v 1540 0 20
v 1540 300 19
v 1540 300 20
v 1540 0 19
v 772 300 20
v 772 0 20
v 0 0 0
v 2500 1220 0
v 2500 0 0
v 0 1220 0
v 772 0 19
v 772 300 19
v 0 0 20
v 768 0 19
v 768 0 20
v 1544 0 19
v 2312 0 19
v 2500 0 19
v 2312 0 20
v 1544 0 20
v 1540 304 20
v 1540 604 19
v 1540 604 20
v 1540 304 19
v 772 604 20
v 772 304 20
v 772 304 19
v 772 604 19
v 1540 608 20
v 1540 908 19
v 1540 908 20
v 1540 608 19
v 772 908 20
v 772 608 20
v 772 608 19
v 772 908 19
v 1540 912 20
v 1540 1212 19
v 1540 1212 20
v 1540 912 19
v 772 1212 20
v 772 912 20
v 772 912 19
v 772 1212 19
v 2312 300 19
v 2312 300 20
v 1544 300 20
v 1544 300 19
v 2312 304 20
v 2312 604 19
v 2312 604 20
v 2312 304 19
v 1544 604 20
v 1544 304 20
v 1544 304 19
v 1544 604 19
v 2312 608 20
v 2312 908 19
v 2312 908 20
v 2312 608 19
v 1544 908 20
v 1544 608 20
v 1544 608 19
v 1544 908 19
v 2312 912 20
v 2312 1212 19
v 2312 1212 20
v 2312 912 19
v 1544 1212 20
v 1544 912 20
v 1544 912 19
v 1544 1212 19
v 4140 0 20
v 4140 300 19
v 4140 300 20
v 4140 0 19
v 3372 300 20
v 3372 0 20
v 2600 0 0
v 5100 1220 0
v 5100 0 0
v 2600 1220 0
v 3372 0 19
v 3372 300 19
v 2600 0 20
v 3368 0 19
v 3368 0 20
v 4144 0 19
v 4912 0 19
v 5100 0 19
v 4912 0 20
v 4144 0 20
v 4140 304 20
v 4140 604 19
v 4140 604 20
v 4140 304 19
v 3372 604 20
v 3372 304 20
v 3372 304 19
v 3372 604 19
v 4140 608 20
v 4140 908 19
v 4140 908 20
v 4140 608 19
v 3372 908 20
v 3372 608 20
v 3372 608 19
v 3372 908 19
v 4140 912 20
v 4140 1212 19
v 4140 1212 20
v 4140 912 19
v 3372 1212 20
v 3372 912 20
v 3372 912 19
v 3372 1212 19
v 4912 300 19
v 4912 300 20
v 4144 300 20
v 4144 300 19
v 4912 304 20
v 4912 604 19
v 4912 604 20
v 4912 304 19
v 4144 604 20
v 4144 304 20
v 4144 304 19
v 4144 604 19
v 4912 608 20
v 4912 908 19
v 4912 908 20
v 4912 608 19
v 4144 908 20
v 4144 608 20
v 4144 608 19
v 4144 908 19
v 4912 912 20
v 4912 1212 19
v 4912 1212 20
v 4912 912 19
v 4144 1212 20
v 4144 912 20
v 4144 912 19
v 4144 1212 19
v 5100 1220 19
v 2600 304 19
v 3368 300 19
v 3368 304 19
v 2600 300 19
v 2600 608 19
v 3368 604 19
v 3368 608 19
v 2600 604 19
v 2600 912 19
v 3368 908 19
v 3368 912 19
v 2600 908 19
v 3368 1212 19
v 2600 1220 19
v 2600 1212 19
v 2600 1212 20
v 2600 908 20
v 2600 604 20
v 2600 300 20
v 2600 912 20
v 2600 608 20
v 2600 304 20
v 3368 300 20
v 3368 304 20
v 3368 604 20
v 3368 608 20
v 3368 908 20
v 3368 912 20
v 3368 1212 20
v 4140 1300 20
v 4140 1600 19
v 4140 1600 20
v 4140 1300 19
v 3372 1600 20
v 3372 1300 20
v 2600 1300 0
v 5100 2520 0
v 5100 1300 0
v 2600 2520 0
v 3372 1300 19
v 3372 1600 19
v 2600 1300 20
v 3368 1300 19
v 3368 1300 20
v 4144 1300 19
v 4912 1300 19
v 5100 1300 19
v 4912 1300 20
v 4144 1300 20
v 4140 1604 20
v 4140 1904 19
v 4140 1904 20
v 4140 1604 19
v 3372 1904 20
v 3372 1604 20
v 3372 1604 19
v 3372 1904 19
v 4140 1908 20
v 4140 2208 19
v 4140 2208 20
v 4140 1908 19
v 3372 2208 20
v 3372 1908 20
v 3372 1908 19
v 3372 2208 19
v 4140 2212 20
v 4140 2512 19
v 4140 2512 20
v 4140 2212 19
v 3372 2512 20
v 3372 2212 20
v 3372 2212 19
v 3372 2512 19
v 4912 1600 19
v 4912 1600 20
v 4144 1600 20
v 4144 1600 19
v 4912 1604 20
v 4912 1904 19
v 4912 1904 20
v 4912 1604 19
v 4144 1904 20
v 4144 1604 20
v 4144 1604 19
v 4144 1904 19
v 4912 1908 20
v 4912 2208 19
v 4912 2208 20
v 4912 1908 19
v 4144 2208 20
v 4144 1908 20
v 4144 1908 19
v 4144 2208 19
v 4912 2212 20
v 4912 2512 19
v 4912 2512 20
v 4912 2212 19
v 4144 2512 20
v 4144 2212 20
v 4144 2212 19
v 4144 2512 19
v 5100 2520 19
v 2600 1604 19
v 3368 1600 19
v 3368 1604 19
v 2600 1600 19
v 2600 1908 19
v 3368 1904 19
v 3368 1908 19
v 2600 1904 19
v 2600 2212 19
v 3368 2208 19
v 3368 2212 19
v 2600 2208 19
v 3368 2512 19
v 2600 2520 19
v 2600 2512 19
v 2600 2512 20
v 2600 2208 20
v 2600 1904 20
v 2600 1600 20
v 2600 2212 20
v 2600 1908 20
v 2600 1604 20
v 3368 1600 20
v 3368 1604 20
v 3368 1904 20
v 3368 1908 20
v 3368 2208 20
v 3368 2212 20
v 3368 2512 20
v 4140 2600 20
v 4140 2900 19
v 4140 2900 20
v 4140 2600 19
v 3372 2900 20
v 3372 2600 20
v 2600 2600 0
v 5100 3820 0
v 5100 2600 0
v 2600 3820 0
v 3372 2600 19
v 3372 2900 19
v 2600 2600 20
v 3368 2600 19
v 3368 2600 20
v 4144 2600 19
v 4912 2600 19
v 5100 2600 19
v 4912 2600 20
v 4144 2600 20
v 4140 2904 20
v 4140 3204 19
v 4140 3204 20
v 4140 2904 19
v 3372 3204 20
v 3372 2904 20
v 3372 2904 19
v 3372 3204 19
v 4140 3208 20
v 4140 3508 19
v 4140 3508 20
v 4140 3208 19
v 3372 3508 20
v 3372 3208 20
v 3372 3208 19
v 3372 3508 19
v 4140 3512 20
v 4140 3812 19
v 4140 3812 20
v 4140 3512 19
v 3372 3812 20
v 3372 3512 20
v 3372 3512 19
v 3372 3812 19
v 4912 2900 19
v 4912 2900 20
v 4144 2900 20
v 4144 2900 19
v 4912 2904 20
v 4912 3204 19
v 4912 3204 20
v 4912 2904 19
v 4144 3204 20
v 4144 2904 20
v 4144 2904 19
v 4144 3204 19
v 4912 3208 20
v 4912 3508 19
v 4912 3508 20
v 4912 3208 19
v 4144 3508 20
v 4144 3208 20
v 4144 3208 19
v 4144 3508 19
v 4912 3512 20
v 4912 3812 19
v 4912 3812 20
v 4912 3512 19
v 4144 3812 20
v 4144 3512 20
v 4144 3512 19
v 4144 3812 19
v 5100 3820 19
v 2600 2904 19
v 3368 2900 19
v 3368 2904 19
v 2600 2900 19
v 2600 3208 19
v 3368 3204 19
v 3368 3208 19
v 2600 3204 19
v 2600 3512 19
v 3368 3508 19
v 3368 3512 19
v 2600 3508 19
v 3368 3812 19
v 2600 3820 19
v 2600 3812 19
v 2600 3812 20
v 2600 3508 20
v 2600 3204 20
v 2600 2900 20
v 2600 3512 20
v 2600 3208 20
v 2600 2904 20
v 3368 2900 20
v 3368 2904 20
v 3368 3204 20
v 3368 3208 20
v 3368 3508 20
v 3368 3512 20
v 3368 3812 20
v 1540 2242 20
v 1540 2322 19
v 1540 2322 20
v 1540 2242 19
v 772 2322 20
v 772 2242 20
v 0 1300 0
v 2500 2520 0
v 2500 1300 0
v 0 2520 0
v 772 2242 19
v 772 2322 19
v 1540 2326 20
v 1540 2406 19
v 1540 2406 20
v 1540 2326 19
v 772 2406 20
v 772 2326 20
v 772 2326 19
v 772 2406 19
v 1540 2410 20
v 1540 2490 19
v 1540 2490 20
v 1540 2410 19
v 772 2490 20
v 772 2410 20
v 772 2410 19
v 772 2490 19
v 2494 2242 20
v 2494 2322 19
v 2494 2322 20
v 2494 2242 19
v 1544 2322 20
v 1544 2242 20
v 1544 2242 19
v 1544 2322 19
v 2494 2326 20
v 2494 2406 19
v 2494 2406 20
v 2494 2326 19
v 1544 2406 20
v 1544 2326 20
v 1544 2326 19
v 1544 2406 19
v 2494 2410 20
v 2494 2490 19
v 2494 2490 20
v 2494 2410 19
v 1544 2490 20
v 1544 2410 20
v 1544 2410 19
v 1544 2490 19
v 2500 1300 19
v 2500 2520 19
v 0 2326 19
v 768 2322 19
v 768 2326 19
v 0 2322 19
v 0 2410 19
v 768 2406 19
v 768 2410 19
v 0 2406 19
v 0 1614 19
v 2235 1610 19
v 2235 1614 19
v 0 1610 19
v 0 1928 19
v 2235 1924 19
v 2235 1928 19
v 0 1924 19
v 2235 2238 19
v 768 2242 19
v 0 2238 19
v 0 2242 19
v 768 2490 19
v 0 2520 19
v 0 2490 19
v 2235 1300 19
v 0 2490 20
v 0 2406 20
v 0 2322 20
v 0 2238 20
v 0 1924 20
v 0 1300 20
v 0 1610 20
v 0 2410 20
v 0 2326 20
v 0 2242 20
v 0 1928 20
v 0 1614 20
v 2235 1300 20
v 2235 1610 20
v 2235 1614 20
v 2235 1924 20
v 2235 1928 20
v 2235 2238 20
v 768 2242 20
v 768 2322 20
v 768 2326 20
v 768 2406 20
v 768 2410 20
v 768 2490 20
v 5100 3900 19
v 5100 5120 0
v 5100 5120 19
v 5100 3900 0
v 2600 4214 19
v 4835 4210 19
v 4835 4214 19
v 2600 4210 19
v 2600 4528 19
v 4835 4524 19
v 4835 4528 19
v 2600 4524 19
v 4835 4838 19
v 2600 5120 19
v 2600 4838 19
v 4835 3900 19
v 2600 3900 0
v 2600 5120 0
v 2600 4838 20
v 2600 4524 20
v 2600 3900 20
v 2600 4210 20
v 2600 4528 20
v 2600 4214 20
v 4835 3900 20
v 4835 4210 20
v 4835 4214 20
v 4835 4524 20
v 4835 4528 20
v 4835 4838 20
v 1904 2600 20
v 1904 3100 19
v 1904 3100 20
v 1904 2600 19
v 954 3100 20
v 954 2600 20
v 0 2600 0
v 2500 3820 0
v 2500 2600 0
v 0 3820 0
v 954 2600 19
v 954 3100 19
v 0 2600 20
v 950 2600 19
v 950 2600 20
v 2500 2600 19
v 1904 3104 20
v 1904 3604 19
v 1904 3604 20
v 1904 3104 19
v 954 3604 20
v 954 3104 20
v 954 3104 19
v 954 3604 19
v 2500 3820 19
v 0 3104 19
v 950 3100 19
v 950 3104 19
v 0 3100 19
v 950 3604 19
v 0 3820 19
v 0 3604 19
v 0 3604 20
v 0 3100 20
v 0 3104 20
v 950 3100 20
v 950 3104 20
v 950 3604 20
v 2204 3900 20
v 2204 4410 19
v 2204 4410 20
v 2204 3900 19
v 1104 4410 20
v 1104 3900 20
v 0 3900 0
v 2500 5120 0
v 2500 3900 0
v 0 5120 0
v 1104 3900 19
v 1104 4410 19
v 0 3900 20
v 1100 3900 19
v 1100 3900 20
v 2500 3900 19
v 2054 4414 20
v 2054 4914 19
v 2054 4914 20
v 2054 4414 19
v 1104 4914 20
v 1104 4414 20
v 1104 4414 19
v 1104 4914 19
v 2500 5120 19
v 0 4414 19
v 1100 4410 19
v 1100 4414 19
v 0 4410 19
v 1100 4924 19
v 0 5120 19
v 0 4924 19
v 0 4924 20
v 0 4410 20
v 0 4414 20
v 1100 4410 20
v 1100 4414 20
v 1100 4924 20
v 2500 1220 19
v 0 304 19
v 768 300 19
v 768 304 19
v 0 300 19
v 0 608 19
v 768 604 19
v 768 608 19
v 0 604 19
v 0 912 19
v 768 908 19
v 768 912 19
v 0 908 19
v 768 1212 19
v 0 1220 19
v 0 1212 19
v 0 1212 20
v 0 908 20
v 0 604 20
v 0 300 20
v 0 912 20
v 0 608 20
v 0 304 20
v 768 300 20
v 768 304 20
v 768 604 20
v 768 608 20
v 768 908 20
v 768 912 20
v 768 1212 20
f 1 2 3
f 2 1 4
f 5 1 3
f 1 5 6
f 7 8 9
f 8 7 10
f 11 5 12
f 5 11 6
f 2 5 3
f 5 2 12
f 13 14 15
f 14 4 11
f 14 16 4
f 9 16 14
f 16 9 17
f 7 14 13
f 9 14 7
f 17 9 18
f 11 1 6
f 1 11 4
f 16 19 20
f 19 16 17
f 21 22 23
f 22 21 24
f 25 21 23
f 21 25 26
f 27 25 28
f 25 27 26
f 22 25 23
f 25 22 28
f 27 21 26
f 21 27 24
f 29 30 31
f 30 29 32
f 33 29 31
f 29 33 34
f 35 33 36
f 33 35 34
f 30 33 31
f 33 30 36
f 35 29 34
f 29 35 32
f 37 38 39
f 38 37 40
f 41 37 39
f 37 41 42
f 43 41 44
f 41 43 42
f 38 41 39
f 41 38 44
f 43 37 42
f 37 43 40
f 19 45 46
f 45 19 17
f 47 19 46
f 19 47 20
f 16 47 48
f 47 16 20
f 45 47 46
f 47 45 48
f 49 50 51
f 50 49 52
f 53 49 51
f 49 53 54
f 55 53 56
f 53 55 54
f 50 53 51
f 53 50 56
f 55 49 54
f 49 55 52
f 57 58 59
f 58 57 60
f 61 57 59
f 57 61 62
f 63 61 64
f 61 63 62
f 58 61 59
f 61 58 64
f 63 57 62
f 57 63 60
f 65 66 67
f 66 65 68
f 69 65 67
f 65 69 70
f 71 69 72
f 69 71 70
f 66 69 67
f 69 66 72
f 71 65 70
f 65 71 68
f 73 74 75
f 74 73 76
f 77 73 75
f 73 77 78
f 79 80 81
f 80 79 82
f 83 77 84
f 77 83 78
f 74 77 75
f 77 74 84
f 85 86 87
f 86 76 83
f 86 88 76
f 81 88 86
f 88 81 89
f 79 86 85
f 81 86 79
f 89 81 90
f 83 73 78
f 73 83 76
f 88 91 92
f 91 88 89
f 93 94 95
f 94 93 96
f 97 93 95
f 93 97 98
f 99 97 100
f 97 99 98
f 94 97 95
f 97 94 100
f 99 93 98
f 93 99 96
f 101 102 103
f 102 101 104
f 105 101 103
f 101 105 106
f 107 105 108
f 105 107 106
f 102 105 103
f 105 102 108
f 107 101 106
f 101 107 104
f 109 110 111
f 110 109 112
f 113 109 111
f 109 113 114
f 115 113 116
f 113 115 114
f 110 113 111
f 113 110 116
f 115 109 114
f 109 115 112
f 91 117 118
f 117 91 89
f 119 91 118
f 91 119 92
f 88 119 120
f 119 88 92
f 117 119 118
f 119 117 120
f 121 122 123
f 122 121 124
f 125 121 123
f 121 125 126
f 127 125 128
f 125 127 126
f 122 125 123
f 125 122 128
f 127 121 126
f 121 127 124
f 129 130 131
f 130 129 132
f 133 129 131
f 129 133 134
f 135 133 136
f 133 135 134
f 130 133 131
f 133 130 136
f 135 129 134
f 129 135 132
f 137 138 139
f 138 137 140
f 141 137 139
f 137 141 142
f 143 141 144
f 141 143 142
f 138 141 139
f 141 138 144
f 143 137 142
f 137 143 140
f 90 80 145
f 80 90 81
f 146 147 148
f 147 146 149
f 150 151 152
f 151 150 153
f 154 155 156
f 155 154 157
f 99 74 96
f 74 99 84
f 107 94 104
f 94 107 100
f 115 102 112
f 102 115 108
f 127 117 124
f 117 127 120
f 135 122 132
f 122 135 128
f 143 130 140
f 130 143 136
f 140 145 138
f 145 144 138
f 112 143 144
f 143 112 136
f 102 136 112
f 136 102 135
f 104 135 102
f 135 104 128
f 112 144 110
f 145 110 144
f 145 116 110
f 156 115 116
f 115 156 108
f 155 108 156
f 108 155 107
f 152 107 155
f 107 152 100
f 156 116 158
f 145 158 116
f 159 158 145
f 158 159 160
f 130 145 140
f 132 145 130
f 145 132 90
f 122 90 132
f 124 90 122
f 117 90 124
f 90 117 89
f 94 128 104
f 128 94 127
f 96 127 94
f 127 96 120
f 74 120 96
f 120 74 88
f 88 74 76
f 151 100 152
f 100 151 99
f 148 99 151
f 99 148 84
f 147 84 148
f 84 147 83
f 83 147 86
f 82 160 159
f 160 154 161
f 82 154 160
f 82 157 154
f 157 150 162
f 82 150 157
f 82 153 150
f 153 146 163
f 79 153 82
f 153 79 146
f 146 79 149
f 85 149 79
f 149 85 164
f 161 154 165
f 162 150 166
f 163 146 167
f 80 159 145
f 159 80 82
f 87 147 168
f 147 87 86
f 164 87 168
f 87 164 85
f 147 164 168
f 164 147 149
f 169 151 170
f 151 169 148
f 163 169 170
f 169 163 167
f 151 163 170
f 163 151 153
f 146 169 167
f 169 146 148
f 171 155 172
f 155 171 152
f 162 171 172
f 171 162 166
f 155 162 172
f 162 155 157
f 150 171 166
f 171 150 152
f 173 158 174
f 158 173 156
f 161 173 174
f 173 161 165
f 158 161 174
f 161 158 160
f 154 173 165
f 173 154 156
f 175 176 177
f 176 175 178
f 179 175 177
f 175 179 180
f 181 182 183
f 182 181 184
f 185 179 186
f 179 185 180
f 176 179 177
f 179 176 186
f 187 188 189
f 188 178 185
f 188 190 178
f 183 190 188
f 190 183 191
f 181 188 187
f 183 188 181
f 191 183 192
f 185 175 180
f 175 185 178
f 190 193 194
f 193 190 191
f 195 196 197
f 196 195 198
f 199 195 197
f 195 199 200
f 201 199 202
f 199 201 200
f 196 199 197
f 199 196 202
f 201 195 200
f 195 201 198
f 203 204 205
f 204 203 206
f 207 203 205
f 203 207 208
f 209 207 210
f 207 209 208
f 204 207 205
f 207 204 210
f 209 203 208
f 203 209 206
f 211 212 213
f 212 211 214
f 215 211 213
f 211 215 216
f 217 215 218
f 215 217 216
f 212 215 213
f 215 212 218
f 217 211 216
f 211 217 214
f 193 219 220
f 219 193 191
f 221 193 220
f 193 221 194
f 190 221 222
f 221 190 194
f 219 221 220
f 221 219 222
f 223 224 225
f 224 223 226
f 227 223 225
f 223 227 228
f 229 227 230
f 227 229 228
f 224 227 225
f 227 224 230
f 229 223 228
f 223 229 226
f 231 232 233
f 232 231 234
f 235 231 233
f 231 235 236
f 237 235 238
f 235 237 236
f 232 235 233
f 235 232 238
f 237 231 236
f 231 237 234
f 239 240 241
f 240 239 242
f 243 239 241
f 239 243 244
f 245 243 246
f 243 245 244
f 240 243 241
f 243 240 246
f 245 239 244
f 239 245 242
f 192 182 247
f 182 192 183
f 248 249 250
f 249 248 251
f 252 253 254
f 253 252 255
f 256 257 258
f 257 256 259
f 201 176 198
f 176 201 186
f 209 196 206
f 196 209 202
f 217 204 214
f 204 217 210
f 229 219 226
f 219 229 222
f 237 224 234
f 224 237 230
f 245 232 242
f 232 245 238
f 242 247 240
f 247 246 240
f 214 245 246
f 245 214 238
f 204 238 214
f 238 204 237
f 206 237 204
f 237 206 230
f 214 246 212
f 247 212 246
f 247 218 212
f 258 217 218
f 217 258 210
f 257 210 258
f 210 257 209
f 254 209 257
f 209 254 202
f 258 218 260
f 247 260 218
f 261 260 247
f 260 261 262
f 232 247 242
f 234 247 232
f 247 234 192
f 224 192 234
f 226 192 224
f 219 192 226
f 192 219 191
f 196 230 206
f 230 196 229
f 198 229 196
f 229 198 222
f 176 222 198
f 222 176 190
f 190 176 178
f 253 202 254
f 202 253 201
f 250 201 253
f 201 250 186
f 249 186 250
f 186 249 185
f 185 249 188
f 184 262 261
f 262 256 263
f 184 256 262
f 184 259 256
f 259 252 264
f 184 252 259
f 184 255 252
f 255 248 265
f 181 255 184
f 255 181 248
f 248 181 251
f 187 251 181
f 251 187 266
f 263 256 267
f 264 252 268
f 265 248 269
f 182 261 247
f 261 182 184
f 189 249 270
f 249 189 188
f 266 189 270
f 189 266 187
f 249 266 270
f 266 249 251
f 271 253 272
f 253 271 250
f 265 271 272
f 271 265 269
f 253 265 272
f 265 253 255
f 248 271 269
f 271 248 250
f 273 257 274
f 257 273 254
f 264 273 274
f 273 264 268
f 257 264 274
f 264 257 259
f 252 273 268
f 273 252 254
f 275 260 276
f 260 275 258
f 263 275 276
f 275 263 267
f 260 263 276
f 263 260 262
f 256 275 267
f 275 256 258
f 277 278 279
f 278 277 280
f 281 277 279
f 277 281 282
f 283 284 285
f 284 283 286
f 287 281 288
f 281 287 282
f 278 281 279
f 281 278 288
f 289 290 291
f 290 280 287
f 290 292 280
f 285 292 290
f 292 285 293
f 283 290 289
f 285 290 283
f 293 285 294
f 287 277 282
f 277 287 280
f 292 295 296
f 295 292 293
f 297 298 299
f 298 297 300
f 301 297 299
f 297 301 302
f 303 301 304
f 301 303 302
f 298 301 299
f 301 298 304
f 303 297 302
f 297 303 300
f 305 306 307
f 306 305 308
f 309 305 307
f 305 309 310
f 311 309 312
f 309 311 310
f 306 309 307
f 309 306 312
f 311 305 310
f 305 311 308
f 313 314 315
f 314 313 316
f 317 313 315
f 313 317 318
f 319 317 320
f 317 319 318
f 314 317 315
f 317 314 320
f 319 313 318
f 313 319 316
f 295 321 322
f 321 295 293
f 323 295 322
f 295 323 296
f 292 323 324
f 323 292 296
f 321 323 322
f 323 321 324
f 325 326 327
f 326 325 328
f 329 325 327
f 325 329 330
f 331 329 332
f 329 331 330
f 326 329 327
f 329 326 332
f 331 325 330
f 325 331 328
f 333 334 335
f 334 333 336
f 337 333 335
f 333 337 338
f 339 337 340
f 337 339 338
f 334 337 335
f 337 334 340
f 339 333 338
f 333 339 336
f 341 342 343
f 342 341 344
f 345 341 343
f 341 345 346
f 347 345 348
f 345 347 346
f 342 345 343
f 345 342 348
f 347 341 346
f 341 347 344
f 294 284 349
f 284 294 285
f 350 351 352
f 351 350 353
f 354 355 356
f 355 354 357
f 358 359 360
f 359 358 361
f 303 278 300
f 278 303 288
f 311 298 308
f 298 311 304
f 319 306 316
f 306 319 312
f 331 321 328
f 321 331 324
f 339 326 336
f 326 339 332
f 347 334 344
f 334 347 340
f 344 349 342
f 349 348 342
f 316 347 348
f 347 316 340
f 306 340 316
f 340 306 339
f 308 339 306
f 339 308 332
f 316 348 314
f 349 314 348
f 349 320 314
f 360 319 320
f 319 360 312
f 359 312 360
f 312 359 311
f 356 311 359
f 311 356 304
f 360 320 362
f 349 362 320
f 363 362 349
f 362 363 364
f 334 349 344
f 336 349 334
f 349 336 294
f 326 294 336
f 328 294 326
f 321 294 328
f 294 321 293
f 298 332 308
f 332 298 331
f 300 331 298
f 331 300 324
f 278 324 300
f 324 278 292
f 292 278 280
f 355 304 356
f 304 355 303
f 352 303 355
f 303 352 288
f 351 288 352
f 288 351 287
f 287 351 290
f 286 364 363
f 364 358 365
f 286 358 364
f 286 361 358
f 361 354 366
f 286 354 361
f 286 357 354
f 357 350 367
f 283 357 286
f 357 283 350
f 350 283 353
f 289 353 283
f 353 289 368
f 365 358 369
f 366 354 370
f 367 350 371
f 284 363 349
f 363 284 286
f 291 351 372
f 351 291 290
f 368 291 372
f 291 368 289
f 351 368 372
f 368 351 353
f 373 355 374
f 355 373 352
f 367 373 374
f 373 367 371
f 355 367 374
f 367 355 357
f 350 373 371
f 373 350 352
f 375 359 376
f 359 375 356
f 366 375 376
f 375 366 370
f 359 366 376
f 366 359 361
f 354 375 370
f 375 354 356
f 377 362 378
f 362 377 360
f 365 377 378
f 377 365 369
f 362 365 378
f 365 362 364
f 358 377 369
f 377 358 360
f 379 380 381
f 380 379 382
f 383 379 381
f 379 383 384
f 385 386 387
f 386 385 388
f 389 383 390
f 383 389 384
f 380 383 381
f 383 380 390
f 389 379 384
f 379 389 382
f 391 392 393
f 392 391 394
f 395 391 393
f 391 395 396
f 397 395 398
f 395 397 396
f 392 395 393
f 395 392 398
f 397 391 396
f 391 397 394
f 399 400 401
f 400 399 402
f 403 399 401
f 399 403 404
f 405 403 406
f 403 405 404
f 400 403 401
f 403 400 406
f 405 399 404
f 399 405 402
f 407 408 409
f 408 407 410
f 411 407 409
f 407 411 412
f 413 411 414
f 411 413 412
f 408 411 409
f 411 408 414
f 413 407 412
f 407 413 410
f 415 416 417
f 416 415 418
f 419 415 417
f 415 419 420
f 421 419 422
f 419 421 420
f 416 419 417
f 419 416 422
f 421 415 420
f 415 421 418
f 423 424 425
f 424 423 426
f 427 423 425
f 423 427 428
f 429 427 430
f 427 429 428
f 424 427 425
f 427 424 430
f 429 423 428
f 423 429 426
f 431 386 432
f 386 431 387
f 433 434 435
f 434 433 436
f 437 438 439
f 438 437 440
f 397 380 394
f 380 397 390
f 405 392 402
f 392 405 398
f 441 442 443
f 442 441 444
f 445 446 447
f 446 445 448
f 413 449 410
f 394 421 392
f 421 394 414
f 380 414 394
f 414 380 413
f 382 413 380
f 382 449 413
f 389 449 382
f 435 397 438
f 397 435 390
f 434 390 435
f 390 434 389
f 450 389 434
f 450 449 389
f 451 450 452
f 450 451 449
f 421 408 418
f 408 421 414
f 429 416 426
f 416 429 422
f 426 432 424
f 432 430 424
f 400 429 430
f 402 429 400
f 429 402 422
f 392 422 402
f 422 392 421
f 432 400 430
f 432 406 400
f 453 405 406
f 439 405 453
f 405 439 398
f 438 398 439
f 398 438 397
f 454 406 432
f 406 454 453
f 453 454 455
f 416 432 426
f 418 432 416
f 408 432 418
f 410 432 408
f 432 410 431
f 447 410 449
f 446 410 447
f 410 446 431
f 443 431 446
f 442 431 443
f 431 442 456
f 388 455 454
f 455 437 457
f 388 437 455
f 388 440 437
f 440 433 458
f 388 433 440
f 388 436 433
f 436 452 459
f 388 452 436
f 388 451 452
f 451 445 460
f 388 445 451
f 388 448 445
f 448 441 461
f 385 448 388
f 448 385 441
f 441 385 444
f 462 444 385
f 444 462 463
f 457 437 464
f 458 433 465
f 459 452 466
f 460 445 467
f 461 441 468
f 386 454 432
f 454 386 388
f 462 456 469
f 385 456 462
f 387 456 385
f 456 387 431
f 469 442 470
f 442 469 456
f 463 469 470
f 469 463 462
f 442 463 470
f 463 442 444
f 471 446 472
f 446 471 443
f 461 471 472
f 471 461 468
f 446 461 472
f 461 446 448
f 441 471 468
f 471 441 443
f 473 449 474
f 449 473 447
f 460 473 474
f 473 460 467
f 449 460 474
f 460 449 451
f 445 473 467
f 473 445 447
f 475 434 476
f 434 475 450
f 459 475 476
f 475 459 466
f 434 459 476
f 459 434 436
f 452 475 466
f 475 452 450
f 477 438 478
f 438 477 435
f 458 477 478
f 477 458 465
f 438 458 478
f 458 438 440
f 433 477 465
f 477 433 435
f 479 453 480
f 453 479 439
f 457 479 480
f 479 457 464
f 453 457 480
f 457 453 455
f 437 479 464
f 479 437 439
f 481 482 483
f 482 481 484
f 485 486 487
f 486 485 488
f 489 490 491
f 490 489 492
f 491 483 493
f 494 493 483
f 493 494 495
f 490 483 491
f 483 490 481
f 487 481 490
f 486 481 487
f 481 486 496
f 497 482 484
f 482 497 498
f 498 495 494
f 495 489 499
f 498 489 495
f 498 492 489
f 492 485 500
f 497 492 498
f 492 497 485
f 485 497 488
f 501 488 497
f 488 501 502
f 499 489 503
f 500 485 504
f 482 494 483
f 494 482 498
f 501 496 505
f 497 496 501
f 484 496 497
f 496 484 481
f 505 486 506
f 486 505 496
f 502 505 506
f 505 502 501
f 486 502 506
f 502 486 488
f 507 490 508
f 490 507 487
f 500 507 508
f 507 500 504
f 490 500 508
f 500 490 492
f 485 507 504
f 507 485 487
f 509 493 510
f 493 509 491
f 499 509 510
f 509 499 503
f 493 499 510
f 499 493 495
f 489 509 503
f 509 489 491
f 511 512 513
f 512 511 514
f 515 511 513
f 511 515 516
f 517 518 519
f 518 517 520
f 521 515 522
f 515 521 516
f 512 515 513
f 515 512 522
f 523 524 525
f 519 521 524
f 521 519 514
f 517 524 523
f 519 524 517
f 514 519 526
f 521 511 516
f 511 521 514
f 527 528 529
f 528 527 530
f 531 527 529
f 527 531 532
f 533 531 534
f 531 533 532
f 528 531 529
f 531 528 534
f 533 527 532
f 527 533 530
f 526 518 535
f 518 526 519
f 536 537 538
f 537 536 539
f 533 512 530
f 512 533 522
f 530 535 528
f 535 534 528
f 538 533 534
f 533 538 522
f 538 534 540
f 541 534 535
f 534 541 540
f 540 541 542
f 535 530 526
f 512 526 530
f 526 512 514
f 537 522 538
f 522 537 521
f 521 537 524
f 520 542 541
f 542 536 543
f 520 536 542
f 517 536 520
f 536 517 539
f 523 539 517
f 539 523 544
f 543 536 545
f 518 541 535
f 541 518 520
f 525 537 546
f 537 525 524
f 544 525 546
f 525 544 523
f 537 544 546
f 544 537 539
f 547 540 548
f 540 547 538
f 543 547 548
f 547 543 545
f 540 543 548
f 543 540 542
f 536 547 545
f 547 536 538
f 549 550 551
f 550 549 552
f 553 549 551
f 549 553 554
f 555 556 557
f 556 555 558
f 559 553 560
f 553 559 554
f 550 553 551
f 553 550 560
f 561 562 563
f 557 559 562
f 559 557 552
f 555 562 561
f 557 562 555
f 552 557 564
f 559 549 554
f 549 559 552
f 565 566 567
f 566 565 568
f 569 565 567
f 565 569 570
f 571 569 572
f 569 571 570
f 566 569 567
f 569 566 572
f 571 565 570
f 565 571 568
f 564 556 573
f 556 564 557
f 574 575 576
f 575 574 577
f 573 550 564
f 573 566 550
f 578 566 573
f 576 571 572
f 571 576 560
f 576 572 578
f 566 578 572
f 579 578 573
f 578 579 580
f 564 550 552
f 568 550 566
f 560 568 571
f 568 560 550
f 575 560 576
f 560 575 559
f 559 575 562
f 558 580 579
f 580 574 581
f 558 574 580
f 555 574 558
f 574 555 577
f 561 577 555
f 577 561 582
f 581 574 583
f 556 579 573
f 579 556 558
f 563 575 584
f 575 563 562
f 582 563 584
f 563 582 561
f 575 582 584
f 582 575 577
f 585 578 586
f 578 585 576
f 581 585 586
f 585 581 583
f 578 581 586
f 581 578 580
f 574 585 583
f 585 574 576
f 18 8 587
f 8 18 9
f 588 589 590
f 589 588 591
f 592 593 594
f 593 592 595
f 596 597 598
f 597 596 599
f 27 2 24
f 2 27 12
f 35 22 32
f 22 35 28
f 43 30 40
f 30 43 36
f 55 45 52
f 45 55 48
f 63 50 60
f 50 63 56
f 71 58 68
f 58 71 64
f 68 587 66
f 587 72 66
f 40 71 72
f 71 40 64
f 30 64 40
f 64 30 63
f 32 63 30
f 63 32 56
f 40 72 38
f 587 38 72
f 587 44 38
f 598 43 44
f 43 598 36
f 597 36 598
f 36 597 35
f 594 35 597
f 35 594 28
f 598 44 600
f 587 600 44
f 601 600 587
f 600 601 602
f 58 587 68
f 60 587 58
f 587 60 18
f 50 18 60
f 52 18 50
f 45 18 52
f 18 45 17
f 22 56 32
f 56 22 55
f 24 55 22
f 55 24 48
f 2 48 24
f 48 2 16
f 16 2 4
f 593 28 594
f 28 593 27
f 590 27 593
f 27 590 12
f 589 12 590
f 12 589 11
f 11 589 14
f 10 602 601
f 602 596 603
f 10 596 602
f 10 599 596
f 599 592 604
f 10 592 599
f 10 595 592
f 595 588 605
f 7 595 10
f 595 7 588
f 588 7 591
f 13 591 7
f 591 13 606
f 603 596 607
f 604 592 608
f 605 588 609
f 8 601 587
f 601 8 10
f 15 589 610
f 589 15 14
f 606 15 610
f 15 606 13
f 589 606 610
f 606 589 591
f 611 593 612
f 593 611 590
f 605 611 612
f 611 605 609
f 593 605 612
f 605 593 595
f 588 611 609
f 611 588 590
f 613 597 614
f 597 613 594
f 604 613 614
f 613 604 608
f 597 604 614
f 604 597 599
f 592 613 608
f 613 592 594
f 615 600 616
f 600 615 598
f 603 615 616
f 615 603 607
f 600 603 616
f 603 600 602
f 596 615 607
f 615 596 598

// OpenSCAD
shelf = [768, 300, 20];      // 48
beam = [2235, 310, 20];      // 6
cover = [768, 80, 20];       // 6

gameshelf = [950, 500, 20];  // 6
gamebeam = [1100, 510, 20];  // 3
gamecover = [950, 80, 20];   // 3

material = [2500, 1220, 19]; // 8

// Shelf boards (4 of them)
color("red") {
  cube(size = material);
}
translate([0, 0, 0]){
  cube(size = shelf);
}
translate([0, 304, 0]){
  cube(size = shelf);
}
translate([0, 608, 0]){
  cube(size = shelf);
}
translate([0, 608, 0]){
  cube(size = shelf);
}
translate([0, 912, 0]){
  cube(size = shelf);
}
translate([772, 0, 0]){
  translate([0, 0, 0]){
    cube(size = shelf);
  }
  translate([0, 304, 0]){
    cube(size = shelf);
  }
  translate([0, 608, 0]){
    cube(size = shelf);
  }
  translate([0, 912, 0]){
    cube(size = shelf);
  }
}
translate([1544, 0, 0]){
  translate([0, 0, 0]){
    cube(size = shelf);
  }
  translate([0, 304, 0]){
    cube(size = shelf);
  }
  translate([0, 608, 0]){
    cube(size = shelf);
  }
  translate([0, 912, 0]){
    cube(size = shelf);
  }
}

translate([2600, 0, 0]){
  color("red") {
    cube(size = material);
  }
  translate([0, 0, 0]){
    cube(size = shelf);
  }
  translate([0, 304, 0]){
    cube(size = shelf);
  }
  translate([0, 608, 0]){
    cube(size = shelf);
  }
  translate([0, 608, 0]){
    cube(size = shelf);
  }
  translate([0, 912, 0]){
    cube(size = shelf);
  }
  translate([772, 0, 0]){
    translate([0, 0, 0]){
      cube(size = shelf);
    }
    translate([0, 304, 0]){
      cube(size = shelf);
    }
    translate([0, 608, 0]){
      cube(size = shelf);
    }
    translate([0, 912, 0]){
      cube(size = shelf);
    }
  }
  translate([1544, 0, 0]){
    translate([0, 0, 0]){
      cube(size = shelf);
    }
    translate([0, 304, 0]){
      cube(size = shelf);
    }
    translate([0, 608, 0]){
      cube(size = shelf);
    }
    translate([0, 912, 0]){
      cube(size = shelf);
    }
  }
}

translate([2600, 1300, 0]){
  color("red") {
    cube(size = material);
  }
  translate([0, 0, 0]){
    cube(size = shelf);
  }
  translate([0, 304, 0]){
    cube(size = shelf);
  }
  translate([0, 608, 0]){
    cube(size = shelf);
  }
  translate([0, 608, 0]){
    cube(size = shelf);
  }
  translate([0, 912, 0]){
    cube(size = shelf);
  }
  translate([772, 0, 0]){
    translate([0, 0, 0]){
      cube(size = shelf);
    }
    translate([0, 304, 0]){
      cube(size = shelf);
    }
    translate([0, 608, 0]){
      cube(size = shelf);
    }
    translate([0, 912, 0]){
      cube(size = shelf);
    }
  }
  translate([1544, 0, 0]){
    translate([0, 0, 0]){
      cube(size = shelf);
    }
    translate([0, 304, 0]){
      cube(size = shelf);
    }
    translate([0, 608, 0]){
      cube(size = shelf);
    }
    translate([0, 912, 0]){
      cube(size = shelf);
    }
  }
}

translate([2600, 2600, 0]){
  color("red") {
    cube(size = material);
  }
  translate([0, 0, 0]){
    cube(size = shelf);
  }
  translate([0, 304, 0]){
    cube(size = shelf);
  }
  translate([0, 608, 0]){
    cube(size = shelf);
  }
  translate([0, 608, 0]){
    cube(size = shelf);
  }
  translate([0, 912, 0]){
    cube(size = shelf);
  }
  translate([772, 0, 0]){
    translate([0, 0, 0]){
      cube(size = shelf);
    }
    translate([0, 304, 0]){
      cube(size = shelf);
    }
    translate([0, 608, 0]){
      cube(size = shelf);
    }
    translate([0, 912, 0]){
      cube(size = shelf);
    }
  }
  translate([1544, 0, 0]){
    translate([0, 0, 0]){
      cube(size = shelf);
    }
    translate([0, 304, 0]){
      cube(size = shelf);
    }
    translate([0, 608, 0]){
      cube(size = shelf);
    }
    translate([0, 912, 0]){
      cube(size = shelf);
    }
  }
}

// BEAMS
translate([0, 1300, 0]){
  color("red") {
    cube(size = material);
  }
  // beams
  translate([0, 0, 0]){
    cube(size = beam);
  }
  translate([0, 314, 0]){
    cube(size = beam);
  }
  translate([0, 628, 0]){
    cube(size = beam);
  }
  // covers
  translate([0, 942, 0]){
    cube(size = cover);
  }
  translate([0, 1026, 0]){
    cube(size = cover);
  }
  translate([0, 1110, 0]){
    cube(size = cover);
  }
  translate([772, 0, 0]){
    translate([0, 942, 0]){
      cube(size = cover);
    }
    translate([0, 1026, 0]){
      cube(size = cover);
    }
    translate([0, 1110, 0]){
      cube(size = cover);
    }
  }
  translate([1544, 0, 0]){
    translate([0, 942, 0]){
      cube(size = gamecover);
    }
    translate([0, 1026, 0]){
      cube(size = gamecover);
    }
    translate([0, 1110, 0]){
      cube(size = gamecover);
    }
  }
}

translate([2600, 3900, 0]){
  color("red") {
    cube(size = material);
  }
  // beams
  translate([0, 0, 0]){
    cube(size = beam);
  }
  translate([0, 314, 0]){
    cube(size = beam);
  }
  translate([0, 628, 0]){
    cube(size = beam);
  }
}

translate([0, 2600, 0]){
  color("red") {
    cube(size = material);
  }
  translate([0, 0, 0]){
    cube(size = gameshelf);
  }
  translate([0, 504, 0]){
    cube(size = gameshelf);
  }
  translate([954, 0, 0]){
    translate([0, 0, 0]){
      cube(size = gameshelf);
    }
    translate([0, 504, 0]){
      cube(size = gameshelf);
    }
  }
}

translate([0, 3900, 0]){
  color("red") {
    cube(size = material);
  }
  translate([0, 0, 0]){
    cube(size = gamebeam);
  }
  translate([0, 514, 0]){
    cube(size = gamebeam);
  }
  translate([1104, 0, 0]){
    translate([0, 0, 0]){
      cube(size = gamebeam);
    }
    translate([0, 514, 0]){
      cube(size = gameshelf);
    }
  }
}
